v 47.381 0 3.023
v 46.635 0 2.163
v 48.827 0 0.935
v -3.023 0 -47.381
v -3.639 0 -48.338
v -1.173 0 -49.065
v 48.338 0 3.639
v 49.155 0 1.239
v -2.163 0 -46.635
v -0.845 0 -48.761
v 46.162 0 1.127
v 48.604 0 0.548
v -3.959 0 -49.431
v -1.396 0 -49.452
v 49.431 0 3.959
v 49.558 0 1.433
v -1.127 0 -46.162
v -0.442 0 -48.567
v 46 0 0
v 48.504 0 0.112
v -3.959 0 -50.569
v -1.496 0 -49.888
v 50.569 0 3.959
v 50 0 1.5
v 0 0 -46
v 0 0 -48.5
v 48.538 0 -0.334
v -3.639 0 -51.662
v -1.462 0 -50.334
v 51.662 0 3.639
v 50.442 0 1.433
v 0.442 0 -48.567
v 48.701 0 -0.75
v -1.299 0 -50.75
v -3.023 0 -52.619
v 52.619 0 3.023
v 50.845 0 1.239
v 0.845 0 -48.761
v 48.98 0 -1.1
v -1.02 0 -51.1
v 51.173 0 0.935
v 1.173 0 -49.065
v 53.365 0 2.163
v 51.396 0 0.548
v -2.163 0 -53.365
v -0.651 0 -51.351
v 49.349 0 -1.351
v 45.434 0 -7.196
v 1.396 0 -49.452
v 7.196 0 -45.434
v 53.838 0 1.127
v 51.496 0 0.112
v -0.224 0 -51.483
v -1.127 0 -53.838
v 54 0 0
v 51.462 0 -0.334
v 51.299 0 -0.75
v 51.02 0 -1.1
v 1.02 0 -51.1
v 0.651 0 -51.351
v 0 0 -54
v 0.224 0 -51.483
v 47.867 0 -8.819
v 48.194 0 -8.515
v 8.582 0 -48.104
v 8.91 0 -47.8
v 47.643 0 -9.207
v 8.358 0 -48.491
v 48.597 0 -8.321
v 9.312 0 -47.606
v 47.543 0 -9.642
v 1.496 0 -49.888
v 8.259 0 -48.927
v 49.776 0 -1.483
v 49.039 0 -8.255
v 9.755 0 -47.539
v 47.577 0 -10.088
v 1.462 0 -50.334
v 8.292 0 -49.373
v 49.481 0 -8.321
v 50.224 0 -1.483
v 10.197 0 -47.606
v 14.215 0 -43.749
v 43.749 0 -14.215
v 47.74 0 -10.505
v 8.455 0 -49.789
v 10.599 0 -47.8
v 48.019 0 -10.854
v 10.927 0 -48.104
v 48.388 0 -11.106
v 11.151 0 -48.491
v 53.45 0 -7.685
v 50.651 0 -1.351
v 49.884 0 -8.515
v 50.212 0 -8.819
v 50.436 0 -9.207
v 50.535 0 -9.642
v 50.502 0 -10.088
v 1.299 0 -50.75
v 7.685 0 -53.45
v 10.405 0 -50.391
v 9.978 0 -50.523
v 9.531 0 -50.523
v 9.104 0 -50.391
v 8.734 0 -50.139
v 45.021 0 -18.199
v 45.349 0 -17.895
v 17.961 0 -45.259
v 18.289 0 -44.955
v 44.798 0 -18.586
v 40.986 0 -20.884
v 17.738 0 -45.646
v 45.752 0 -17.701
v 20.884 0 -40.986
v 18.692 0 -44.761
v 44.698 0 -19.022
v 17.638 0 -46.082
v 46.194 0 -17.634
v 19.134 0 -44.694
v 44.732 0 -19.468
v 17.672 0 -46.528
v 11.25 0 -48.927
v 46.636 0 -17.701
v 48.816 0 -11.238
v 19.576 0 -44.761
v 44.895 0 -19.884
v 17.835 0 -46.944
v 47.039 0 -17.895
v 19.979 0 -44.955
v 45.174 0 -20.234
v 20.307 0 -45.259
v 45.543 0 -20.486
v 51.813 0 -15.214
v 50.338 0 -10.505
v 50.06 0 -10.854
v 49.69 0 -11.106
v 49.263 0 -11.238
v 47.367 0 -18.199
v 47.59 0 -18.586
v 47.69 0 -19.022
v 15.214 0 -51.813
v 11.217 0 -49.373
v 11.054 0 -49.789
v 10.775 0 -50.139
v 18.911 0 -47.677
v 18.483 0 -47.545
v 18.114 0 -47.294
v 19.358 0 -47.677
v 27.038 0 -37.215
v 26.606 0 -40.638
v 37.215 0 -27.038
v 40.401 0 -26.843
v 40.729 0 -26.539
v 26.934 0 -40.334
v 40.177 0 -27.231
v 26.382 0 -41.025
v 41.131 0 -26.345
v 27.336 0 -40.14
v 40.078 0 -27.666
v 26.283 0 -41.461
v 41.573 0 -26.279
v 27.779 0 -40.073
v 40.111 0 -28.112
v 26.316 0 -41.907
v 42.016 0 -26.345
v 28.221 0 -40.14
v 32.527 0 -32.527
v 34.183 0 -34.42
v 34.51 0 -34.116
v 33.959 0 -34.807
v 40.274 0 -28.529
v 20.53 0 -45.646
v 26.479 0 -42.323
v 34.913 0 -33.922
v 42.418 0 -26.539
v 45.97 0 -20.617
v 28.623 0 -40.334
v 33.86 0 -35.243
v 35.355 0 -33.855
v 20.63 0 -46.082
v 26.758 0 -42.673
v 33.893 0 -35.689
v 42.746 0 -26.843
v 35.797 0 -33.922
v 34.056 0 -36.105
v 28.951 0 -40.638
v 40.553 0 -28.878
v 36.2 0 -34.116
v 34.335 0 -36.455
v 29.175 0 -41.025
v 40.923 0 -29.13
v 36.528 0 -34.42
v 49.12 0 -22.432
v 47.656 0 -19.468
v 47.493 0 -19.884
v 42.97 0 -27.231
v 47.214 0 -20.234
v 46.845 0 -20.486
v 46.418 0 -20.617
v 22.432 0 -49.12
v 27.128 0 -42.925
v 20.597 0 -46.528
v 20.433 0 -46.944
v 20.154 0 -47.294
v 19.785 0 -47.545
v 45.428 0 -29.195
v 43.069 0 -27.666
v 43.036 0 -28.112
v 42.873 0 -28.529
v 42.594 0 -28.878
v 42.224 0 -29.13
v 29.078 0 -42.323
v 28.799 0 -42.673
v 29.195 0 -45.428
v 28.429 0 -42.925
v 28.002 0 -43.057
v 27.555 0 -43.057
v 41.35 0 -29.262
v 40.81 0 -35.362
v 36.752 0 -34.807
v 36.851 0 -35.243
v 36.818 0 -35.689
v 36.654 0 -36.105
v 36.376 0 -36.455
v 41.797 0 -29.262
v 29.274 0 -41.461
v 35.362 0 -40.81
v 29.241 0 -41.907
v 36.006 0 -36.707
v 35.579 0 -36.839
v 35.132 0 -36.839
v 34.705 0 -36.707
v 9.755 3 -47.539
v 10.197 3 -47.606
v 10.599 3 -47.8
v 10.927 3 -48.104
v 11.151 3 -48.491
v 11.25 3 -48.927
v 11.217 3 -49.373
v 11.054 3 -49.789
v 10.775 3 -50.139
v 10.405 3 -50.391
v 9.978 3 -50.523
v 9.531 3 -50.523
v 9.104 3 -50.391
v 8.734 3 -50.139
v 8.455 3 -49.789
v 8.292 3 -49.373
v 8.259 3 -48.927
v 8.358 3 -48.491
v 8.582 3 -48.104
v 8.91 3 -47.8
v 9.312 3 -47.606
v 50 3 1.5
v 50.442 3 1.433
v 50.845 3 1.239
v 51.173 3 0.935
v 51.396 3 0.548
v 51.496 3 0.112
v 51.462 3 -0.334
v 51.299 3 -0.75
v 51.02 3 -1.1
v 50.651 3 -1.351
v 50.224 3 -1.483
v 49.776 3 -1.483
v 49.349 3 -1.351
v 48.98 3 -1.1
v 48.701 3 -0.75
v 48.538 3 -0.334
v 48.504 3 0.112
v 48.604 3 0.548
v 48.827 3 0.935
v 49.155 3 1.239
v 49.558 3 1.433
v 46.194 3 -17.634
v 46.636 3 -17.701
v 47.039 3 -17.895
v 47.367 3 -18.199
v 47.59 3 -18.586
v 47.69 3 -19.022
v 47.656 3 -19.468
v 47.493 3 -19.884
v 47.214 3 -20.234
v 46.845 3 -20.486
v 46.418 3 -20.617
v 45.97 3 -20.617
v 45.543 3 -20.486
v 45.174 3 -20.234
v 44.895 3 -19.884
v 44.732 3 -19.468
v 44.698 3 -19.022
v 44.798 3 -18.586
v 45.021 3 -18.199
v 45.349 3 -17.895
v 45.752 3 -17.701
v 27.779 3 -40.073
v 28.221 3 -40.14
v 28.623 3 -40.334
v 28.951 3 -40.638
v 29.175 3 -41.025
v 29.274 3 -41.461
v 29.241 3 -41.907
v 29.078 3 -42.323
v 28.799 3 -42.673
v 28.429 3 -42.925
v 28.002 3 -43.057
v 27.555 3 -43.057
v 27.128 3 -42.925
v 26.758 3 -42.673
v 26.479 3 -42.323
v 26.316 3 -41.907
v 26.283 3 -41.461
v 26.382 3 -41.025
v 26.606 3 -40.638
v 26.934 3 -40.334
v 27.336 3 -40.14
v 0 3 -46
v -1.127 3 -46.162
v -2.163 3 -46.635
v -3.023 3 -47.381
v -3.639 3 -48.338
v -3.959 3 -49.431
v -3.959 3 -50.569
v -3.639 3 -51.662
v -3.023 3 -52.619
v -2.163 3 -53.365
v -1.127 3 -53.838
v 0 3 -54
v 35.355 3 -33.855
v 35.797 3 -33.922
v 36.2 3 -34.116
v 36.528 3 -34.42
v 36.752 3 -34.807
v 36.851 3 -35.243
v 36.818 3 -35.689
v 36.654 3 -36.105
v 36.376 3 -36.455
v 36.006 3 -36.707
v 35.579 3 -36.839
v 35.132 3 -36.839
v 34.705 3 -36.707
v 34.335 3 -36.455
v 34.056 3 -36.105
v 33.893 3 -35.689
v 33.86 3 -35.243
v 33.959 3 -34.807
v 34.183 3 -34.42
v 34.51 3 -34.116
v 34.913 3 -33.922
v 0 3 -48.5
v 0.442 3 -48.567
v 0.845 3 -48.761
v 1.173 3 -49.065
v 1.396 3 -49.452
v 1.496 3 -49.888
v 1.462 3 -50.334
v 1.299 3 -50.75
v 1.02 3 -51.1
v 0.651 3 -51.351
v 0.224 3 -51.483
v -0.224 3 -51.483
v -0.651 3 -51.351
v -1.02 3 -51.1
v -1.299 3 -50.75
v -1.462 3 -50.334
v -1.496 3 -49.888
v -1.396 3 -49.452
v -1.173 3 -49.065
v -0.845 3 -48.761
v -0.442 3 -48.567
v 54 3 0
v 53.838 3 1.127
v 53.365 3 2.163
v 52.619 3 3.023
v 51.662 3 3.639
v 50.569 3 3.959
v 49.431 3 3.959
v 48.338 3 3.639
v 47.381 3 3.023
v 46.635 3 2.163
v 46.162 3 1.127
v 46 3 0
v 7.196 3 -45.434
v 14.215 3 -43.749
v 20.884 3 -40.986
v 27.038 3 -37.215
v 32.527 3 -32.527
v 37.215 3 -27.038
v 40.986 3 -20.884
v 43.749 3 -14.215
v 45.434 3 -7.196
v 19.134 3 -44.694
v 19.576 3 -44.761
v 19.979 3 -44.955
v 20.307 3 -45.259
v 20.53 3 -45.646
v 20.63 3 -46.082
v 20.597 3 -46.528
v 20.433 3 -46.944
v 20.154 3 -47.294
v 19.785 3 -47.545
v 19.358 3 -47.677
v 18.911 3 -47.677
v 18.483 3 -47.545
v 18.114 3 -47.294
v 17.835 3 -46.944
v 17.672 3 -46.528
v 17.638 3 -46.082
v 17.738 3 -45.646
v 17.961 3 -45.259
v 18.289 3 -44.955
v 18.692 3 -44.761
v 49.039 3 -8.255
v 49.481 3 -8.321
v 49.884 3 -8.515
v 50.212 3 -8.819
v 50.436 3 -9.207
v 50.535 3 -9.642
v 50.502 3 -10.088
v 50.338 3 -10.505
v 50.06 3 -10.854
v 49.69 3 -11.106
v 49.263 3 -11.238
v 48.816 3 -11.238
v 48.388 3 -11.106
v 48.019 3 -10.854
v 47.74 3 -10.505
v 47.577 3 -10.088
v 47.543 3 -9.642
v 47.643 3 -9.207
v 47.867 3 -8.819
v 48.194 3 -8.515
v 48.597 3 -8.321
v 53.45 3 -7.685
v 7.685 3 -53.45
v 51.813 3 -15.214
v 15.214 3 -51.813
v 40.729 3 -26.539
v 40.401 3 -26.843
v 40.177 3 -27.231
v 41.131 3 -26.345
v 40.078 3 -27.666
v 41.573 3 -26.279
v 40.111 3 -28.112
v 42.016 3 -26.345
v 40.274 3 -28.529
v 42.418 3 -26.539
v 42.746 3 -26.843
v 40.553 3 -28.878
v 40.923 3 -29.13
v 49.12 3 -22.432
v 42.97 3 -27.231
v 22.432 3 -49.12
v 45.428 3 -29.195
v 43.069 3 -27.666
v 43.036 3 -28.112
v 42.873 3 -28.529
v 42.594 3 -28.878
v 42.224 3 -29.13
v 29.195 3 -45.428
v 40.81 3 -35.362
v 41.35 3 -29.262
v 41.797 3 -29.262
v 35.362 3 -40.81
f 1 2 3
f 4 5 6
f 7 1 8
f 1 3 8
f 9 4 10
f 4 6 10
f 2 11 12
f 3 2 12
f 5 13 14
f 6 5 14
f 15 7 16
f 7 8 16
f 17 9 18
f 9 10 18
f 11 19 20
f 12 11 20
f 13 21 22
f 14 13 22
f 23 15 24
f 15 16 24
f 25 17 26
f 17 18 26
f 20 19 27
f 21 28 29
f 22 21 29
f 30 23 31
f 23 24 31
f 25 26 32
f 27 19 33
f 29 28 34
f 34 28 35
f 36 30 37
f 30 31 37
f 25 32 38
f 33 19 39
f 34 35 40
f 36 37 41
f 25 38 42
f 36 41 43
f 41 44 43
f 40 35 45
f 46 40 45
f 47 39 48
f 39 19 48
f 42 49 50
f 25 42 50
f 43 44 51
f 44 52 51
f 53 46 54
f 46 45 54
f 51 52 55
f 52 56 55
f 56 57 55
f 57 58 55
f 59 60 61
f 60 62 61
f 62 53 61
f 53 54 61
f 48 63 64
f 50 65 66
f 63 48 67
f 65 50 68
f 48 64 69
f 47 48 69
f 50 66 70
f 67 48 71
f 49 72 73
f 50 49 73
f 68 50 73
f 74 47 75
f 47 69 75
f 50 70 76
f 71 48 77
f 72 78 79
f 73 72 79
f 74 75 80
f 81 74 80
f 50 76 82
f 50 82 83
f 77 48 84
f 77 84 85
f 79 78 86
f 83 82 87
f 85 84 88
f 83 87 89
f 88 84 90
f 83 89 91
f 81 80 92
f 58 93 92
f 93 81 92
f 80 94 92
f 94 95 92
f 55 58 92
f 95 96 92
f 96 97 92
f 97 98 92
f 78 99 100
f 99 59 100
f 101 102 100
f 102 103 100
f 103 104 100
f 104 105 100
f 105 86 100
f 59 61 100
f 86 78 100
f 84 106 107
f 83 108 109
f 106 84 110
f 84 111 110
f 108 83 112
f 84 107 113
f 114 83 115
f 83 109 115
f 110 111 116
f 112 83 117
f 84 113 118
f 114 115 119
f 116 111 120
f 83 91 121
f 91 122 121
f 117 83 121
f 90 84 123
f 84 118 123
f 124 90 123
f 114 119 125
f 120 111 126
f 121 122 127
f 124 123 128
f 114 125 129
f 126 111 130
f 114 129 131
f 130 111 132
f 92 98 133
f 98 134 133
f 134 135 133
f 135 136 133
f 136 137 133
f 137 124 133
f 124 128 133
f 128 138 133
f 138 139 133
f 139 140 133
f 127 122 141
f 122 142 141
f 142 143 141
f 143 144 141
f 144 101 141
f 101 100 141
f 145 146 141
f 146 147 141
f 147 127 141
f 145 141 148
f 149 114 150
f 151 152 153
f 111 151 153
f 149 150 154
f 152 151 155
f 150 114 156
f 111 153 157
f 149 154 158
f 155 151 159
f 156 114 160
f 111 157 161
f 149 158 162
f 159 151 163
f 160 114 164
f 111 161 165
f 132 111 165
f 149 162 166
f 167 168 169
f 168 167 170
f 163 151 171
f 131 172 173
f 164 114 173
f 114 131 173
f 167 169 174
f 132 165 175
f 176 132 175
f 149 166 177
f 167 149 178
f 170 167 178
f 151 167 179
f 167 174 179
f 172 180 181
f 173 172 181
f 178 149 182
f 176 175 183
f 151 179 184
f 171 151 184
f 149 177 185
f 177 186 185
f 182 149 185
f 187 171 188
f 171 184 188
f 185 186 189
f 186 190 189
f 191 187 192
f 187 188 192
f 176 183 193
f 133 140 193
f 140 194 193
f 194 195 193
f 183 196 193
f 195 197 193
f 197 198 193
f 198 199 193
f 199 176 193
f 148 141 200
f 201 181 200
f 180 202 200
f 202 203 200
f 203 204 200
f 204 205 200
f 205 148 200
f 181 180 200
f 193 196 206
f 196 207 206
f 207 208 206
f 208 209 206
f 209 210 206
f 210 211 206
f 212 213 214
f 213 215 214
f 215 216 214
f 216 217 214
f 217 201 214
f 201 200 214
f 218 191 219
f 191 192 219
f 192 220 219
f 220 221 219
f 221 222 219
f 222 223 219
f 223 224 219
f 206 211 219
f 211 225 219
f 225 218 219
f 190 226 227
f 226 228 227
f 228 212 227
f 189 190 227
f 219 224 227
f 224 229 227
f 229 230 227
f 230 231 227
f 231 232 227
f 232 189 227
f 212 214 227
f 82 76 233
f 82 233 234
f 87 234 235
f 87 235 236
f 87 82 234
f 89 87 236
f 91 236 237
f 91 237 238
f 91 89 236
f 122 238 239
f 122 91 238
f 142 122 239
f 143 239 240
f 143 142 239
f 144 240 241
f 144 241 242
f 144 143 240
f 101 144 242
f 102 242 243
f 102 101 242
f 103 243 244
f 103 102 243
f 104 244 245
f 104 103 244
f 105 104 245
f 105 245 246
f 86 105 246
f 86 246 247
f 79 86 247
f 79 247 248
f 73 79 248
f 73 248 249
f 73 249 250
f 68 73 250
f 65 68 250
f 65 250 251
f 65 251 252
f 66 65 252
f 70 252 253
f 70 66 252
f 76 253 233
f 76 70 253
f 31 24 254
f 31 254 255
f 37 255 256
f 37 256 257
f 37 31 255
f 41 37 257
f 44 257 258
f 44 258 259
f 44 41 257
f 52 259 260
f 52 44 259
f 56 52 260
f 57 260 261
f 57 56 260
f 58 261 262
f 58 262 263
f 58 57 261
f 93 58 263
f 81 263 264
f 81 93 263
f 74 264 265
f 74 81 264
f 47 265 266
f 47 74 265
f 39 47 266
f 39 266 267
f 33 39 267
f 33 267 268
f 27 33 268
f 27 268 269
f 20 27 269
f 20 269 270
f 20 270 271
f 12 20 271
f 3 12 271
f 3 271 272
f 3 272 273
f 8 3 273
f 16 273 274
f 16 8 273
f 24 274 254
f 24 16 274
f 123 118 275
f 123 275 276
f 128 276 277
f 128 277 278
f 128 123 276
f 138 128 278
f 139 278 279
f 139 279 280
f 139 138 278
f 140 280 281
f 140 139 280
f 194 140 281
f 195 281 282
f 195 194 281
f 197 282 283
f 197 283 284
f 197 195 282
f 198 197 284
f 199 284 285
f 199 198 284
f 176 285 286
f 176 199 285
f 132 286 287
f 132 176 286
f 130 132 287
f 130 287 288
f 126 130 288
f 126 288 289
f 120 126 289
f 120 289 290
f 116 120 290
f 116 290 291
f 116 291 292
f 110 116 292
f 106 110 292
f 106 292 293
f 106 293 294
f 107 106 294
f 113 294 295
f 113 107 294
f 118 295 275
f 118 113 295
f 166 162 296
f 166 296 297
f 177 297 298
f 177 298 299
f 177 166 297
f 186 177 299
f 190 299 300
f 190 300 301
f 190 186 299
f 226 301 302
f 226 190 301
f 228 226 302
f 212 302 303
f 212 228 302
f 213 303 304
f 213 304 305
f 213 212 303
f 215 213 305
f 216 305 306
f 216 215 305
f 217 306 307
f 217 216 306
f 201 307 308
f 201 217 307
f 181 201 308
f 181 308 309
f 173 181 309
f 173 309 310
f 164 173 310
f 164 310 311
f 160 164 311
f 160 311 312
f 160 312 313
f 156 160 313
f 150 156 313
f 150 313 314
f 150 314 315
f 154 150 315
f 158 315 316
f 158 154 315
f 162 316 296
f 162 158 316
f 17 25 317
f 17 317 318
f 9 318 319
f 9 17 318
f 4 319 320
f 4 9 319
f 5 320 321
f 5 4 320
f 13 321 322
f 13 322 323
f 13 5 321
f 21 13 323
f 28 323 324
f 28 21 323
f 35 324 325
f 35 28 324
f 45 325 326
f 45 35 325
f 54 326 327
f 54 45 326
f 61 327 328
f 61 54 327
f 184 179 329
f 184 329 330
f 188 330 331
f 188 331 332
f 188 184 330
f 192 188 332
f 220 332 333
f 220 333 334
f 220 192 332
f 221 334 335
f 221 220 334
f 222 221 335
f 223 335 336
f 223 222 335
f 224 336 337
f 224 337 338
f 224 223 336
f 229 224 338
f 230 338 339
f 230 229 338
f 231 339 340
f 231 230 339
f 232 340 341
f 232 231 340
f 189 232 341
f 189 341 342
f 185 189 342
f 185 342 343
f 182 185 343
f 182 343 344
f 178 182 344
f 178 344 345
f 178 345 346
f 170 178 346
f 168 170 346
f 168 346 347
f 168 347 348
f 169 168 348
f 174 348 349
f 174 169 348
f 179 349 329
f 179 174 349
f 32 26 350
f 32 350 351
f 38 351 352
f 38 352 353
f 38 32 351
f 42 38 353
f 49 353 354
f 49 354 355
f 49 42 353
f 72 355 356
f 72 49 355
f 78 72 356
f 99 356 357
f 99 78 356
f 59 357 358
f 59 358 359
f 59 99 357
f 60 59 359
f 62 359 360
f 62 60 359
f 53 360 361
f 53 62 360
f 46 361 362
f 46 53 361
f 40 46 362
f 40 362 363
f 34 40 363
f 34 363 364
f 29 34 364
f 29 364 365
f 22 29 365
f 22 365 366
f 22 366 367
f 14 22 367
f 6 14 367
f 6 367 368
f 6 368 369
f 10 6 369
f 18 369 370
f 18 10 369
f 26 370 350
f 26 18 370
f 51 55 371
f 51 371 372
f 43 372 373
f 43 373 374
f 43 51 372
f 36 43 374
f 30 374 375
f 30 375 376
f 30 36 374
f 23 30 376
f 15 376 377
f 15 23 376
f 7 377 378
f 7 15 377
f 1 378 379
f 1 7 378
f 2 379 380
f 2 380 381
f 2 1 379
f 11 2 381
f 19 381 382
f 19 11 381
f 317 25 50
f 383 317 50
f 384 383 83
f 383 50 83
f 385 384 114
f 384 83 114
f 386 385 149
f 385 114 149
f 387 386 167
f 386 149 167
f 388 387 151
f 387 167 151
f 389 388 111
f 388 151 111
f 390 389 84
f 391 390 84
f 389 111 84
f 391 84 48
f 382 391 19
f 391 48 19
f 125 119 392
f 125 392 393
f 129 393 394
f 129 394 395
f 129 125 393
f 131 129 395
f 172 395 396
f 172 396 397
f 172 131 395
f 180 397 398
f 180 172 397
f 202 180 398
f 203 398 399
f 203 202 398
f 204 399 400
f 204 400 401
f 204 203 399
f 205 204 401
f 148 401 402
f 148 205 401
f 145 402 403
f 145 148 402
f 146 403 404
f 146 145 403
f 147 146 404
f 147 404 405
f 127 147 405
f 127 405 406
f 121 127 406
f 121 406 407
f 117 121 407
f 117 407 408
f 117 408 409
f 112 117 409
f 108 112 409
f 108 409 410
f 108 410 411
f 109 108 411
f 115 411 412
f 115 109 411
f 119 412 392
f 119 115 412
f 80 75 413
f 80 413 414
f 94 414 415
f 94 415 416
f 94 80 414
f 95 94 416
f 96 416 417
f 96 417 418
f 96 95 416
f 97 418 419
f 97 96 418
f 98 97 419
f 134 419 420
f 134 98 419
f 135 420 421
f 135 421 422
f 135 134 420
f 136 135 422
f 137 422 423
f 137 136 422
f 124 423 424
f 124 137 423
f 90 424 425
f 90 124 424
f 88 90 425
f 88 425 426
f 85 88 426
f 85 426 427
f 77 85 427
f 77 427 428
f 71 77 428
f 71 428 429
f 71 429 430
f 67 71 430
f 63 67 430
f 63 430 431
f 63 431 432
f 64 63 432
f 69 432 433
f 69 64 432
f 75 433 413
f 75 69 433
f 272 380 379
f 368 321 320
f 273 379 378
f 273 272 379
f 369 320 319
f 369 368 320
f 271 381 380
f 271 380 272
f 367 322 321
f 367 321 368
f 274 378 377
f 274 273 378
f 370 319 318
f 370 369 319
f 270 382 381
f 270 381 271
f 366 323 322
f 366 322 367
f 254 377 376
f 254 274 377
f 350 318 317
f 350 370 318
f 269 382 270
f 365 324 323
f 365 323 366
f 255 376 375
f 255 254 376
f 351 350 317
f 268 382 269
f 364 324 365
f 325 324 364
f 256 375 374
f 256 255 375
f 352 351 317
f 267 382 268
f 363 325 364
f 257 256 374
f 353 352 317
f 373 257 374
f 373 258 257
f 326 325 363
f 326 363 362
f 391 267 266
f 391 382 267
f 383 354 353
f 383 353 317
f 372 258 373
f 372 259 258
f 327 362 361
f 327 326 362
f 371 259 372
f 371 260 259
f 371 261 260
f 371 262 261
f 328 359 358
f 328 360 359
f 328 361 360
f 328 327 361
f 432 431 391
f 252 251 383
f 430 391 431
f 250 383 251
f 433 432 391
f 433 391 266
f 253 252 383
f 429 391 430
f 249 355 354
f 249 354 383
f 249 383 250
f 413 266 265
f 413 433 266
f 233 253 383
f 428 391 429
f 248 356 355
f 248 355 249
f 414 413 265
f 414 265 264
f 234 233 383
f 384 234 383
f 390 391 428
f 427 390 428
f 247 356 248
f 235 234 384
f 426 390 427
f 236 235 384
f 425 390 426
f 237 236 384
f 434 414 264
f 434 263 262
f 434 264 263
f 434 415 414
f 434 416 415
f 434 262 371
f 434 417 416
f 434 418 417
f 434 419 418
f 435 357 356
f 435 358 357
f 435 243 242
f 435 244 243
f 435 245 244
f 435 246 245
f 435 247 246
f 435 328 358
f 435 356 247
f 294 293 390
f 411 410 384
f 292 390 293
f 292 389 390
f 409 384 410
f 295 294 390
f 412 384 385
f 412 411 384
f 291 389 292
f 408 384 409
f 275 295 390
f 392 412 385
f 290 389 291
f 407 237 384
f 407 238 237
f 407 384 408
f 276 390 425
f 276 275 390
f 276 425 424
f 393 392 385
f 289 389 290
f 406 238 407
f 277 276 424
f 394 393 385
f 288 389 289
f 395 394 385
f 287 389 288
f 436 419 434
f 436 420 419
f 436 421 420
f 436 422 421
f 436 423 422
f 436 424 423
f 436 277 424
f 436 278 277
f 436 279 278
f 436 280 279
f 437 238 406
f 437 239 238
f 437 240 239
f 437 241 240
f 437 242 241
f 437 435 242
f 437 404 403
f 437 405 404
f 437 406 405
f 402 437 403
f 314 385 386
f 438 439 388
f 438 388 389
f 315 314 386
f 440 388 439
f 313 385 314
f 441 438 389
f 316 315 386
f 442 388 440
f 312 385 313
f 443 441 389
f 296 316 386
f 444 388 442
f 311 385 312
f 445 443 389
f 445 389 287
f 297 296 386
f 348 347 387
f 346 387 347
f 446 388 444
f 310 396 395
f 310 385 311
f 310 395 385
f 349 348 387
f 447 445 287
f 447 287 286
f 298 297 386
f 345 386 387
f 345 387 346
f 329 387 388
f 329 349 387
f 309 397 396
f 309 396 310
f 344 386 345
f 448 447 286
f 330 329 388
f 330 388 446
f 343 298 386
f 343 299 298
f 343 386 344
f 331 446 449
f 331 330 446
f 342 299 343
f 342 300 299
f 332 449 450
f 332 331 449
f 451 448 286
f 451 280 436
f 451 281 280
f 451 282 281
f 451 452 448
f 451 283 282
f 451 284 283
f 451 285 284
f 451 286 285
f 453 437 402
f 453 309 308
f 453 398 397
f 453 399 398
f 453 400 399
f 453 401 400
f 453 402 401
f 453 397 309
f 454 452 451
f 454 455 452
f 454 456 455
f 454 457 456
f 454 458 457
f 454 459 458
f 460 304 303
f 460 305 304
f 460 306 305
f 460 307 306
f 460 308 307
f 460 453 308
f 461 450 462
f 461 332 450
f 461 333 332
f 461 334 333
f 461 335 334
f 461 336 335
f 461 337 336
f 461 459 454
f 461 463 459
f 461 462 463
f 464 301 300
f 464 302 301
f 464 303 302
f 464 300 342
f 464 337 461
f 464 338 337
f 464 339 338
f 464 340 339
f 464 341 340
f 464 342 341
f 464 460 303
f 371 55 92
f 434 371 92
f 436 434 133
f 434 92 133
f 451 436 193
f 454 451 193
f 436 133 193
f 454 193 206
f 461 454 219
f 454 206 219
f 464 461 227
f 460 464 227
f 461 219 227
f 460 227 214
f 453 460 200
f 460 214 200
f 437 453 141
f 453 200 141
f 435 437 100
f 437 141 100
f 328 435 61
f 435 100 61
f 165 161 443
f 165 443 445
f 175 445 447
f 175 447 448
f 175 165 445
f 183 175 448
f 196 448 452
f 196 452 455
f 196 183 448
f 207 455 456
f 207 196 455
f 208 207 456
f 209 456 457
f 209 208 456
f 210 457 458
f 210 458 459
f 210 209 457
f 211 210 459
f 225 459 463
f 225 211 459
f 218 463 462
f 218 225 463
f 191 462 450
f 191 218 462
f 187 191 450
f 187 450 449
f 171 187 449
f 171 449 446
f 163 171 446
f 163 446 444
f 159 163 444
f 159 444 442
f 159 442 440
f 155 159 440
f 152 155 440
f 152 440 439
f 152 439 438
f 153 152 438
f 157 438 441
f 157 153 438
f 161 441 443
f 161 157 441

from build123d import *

# Parameters (mm, degrees)
SKETCH1_R           = 1.5
BOSS_EXTRUDE1_DEPTH = 3
CUT_EXTRUDE1_START  = -3
CUT_EXTRUDE1_DEPTH  = 3


with BuildPart() as part:
    # Sketch1 → Boss-Extrude1 (new body)
    with BuildSketch(Plane(origin=(0, 0, 0), x_dir=(1, 0, 0), z_dir=(0, 1, 0))):
        with BuildLine():
            Line((-5.292925578, 53.73997524), (-4.508788455, 45.778497427))
            ThreePointArc((-4.508788455, 45.778497427), (-2.257113019, 45.944590985), (0, 46))
            ThreePointArc((0, 46), (32.526911935, 32.526911935), (46, 0))
            ThreePointArc((46, 0), (45.944590985, -2.257113019), (45.778497427, -4.508788455))
            Line((45.778497427, -4.508788455), (53.73997524, -5.292925578))
            ThreePointArc((53.73997524, -5.292925578), (53.934954635, -2.649654414), (54, 0))
            ThreePointArc((54, 0), (36.264183562, 40.011360769), (-5.292925578, 53.73997524))
        make_face()
        with Locations(Location((50, 0, 0), (0, 0, 270))):
            Circle(SKETCH1_R, mode=Mode.SUBTRACT)
        with Locations(Location((49.03926402, 9.754516101, 0), (0, 0, 270))):
            Circle(SKETCH1_R, mode=Mode.SUBTRACT)
        with Locations(Location((46.193976626, 19.134171618, 0), (0, 0, 270))):
            Circle(SKETCH1_R, mode=Mode.SUBTRACT)
        with Locations(Location((0, 50, 0), (0, 0, 270))):
            Circle(SKETCH1_R, mode=Mode.SUBTRACT)
        with Locations(Location((9.754516101, 49.03926402, 0), (0, 0, 270))):
            Circle(SKETCH1_R, mode=Mode.SUBTRACT)
        with Locations(Location((19.134171618, 46.193976626, 0), (0, 0, 270))):
            Circle(SKETCH1_R, mode=Mode.SUBTRACT)
        with Locations(Location((35.355339059, 35.355339059, 0), (0, 0, 270))):
            Circle(SKETCH1_R, mode=Mode.SUBTRACT)
        with Locations(Location((41.573480615, 27.778511651, 0), (0, 0, 270))):
            Circle(SKETCH1_R, mode=Mode.SUBTRACT)
        with Locations(Location((27.778511651, 41.573480615, 0), (0, 0, 270))):
            Circle(SKETCH1_R, mode=Mode.SUBTRACT)
    extrude(amount=BOSS_EXTRUDE1_DEPTH)

    # Sketch2 → Cut-Extrude1 (cut)
    with BuildSketch(Plane(origin=(0, 3, 0), x_dir=(1, 0, 0), z_dir=(0, 1, 0)).offset(CUT_EXTRUDE1_START)):
        with BuildLine():
            ThreePointArc((1e-08, 46), (-4, 50.000000016), (4.3e-08, 54))
            ThreePointArc((4.3e-08, 54), (-2.649654392, 53.934954636), (-5.292925578, 53.73997524))
            Line((-5.292925578, 53.73997524), (-4.508788455, 45.778497427))
            ThreePointArc((-4.508788455, 45.778497427), (-2.257113014, 45.944590986), (1e-08, 46))
        make_face()
        with BuildLine():
            ThreePointArc((53.73997524, -5.292925578), (53.934954635, -2.649654414), (54, 0))
            ThreePointArc((54, 0), (49.999999885, -4), (46, 2.31e-07))
            ThreePointArc((46, 2.31e-07), (45.944590991, -2.257112904), (45.778497427, -4.508788455))
            Line((45.778497427, -4.508788455), (53.73997524, -5.292925578))
        make_face()
    extrude(amount=CUT_EXTRUDE1_DEPTH, mode=Mode.SUBTRACT)


solid = part.part
